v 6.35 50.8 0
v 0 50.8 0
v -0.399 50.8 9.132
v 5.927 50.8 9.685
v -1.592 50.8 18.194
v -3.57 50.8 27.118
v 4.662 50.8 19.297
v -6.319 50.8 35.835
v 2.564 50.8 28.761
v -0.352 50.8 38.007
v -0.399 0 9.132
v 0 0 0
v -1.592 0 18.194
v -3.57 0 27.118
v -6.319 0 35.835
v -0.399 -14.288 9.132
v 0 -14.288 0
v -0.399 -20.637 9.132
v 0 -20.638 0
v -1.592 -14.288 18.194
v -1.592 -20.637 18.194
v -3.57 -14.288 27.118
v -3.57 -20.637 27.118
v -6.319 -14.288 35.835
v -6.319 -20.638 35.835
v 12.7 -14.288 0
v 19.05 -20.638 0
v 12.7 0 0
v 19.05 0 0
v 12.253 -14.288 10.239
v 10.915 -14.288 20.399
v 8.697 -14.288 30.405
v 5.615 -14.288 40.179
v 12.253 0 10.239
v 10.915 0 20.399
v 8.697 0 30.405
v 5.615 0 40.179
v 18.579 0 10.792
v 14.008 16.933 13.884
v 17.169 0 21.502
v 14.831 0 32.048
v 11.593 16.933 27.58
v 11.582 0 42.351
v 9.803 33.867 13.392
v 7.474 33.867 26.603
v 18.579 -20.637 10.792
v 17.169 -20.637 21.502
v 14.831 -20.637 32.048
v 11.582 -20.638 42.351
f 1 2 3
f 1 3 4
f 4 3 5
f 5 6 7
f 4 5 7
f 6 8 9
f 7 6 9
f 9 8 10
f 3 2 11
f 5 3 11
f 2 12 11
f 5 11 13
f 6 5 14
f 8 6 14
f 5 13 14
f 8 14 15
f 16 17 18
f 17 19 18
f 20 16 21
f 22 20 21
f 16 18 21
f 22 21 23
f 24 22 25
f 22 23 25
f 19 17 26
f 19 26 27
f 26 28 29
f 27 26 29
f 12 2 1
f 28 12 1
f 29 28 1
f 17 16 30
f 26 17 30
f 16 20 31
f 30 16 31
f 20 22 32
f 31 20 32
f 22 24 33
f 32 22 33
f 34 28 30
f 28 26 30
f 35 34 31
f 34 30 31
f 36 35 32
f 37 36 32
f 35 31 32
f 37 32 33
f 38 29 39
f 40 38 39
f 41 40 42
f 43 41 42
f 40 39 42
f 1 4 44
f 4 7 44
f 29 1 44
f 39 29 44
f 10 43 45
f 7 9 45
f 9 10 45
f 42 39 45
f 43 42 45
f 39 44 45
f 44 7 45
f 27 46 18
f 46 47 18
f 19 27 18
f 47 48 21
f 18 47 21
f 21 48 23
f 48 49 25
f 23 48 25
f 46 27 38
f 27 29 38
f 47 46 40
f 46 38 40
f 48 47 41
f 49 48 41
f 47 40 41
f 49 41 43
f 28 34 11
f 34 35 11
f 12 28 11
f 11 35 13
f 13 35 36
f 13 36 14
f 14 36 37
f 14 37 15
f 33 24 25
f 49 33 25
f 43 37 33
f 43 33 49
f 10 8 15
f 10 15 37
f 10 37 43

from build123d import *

# Parameters (mm, degrees)
REVOLVE1_ANGLE = 20


with BuildPart() as part:
    # Sketch1 → Revolve1 (revolve)
    with BuildSketch(Plane.XY):
        Polygon((0, 50.8), (0, 0), (12.7, 0), (12.7, -14.2875), (0, -14.2875), (0, -20.6375), (19.05, -20.6375), (19.05, 0), (6.35, 50.8), align=None)
    revolve(axis=Axis((-104.775, 37.30546868, 0), (0, -1, 0)), revolution_arc=REVOLVE1_ANGLE)


solid = part.part
